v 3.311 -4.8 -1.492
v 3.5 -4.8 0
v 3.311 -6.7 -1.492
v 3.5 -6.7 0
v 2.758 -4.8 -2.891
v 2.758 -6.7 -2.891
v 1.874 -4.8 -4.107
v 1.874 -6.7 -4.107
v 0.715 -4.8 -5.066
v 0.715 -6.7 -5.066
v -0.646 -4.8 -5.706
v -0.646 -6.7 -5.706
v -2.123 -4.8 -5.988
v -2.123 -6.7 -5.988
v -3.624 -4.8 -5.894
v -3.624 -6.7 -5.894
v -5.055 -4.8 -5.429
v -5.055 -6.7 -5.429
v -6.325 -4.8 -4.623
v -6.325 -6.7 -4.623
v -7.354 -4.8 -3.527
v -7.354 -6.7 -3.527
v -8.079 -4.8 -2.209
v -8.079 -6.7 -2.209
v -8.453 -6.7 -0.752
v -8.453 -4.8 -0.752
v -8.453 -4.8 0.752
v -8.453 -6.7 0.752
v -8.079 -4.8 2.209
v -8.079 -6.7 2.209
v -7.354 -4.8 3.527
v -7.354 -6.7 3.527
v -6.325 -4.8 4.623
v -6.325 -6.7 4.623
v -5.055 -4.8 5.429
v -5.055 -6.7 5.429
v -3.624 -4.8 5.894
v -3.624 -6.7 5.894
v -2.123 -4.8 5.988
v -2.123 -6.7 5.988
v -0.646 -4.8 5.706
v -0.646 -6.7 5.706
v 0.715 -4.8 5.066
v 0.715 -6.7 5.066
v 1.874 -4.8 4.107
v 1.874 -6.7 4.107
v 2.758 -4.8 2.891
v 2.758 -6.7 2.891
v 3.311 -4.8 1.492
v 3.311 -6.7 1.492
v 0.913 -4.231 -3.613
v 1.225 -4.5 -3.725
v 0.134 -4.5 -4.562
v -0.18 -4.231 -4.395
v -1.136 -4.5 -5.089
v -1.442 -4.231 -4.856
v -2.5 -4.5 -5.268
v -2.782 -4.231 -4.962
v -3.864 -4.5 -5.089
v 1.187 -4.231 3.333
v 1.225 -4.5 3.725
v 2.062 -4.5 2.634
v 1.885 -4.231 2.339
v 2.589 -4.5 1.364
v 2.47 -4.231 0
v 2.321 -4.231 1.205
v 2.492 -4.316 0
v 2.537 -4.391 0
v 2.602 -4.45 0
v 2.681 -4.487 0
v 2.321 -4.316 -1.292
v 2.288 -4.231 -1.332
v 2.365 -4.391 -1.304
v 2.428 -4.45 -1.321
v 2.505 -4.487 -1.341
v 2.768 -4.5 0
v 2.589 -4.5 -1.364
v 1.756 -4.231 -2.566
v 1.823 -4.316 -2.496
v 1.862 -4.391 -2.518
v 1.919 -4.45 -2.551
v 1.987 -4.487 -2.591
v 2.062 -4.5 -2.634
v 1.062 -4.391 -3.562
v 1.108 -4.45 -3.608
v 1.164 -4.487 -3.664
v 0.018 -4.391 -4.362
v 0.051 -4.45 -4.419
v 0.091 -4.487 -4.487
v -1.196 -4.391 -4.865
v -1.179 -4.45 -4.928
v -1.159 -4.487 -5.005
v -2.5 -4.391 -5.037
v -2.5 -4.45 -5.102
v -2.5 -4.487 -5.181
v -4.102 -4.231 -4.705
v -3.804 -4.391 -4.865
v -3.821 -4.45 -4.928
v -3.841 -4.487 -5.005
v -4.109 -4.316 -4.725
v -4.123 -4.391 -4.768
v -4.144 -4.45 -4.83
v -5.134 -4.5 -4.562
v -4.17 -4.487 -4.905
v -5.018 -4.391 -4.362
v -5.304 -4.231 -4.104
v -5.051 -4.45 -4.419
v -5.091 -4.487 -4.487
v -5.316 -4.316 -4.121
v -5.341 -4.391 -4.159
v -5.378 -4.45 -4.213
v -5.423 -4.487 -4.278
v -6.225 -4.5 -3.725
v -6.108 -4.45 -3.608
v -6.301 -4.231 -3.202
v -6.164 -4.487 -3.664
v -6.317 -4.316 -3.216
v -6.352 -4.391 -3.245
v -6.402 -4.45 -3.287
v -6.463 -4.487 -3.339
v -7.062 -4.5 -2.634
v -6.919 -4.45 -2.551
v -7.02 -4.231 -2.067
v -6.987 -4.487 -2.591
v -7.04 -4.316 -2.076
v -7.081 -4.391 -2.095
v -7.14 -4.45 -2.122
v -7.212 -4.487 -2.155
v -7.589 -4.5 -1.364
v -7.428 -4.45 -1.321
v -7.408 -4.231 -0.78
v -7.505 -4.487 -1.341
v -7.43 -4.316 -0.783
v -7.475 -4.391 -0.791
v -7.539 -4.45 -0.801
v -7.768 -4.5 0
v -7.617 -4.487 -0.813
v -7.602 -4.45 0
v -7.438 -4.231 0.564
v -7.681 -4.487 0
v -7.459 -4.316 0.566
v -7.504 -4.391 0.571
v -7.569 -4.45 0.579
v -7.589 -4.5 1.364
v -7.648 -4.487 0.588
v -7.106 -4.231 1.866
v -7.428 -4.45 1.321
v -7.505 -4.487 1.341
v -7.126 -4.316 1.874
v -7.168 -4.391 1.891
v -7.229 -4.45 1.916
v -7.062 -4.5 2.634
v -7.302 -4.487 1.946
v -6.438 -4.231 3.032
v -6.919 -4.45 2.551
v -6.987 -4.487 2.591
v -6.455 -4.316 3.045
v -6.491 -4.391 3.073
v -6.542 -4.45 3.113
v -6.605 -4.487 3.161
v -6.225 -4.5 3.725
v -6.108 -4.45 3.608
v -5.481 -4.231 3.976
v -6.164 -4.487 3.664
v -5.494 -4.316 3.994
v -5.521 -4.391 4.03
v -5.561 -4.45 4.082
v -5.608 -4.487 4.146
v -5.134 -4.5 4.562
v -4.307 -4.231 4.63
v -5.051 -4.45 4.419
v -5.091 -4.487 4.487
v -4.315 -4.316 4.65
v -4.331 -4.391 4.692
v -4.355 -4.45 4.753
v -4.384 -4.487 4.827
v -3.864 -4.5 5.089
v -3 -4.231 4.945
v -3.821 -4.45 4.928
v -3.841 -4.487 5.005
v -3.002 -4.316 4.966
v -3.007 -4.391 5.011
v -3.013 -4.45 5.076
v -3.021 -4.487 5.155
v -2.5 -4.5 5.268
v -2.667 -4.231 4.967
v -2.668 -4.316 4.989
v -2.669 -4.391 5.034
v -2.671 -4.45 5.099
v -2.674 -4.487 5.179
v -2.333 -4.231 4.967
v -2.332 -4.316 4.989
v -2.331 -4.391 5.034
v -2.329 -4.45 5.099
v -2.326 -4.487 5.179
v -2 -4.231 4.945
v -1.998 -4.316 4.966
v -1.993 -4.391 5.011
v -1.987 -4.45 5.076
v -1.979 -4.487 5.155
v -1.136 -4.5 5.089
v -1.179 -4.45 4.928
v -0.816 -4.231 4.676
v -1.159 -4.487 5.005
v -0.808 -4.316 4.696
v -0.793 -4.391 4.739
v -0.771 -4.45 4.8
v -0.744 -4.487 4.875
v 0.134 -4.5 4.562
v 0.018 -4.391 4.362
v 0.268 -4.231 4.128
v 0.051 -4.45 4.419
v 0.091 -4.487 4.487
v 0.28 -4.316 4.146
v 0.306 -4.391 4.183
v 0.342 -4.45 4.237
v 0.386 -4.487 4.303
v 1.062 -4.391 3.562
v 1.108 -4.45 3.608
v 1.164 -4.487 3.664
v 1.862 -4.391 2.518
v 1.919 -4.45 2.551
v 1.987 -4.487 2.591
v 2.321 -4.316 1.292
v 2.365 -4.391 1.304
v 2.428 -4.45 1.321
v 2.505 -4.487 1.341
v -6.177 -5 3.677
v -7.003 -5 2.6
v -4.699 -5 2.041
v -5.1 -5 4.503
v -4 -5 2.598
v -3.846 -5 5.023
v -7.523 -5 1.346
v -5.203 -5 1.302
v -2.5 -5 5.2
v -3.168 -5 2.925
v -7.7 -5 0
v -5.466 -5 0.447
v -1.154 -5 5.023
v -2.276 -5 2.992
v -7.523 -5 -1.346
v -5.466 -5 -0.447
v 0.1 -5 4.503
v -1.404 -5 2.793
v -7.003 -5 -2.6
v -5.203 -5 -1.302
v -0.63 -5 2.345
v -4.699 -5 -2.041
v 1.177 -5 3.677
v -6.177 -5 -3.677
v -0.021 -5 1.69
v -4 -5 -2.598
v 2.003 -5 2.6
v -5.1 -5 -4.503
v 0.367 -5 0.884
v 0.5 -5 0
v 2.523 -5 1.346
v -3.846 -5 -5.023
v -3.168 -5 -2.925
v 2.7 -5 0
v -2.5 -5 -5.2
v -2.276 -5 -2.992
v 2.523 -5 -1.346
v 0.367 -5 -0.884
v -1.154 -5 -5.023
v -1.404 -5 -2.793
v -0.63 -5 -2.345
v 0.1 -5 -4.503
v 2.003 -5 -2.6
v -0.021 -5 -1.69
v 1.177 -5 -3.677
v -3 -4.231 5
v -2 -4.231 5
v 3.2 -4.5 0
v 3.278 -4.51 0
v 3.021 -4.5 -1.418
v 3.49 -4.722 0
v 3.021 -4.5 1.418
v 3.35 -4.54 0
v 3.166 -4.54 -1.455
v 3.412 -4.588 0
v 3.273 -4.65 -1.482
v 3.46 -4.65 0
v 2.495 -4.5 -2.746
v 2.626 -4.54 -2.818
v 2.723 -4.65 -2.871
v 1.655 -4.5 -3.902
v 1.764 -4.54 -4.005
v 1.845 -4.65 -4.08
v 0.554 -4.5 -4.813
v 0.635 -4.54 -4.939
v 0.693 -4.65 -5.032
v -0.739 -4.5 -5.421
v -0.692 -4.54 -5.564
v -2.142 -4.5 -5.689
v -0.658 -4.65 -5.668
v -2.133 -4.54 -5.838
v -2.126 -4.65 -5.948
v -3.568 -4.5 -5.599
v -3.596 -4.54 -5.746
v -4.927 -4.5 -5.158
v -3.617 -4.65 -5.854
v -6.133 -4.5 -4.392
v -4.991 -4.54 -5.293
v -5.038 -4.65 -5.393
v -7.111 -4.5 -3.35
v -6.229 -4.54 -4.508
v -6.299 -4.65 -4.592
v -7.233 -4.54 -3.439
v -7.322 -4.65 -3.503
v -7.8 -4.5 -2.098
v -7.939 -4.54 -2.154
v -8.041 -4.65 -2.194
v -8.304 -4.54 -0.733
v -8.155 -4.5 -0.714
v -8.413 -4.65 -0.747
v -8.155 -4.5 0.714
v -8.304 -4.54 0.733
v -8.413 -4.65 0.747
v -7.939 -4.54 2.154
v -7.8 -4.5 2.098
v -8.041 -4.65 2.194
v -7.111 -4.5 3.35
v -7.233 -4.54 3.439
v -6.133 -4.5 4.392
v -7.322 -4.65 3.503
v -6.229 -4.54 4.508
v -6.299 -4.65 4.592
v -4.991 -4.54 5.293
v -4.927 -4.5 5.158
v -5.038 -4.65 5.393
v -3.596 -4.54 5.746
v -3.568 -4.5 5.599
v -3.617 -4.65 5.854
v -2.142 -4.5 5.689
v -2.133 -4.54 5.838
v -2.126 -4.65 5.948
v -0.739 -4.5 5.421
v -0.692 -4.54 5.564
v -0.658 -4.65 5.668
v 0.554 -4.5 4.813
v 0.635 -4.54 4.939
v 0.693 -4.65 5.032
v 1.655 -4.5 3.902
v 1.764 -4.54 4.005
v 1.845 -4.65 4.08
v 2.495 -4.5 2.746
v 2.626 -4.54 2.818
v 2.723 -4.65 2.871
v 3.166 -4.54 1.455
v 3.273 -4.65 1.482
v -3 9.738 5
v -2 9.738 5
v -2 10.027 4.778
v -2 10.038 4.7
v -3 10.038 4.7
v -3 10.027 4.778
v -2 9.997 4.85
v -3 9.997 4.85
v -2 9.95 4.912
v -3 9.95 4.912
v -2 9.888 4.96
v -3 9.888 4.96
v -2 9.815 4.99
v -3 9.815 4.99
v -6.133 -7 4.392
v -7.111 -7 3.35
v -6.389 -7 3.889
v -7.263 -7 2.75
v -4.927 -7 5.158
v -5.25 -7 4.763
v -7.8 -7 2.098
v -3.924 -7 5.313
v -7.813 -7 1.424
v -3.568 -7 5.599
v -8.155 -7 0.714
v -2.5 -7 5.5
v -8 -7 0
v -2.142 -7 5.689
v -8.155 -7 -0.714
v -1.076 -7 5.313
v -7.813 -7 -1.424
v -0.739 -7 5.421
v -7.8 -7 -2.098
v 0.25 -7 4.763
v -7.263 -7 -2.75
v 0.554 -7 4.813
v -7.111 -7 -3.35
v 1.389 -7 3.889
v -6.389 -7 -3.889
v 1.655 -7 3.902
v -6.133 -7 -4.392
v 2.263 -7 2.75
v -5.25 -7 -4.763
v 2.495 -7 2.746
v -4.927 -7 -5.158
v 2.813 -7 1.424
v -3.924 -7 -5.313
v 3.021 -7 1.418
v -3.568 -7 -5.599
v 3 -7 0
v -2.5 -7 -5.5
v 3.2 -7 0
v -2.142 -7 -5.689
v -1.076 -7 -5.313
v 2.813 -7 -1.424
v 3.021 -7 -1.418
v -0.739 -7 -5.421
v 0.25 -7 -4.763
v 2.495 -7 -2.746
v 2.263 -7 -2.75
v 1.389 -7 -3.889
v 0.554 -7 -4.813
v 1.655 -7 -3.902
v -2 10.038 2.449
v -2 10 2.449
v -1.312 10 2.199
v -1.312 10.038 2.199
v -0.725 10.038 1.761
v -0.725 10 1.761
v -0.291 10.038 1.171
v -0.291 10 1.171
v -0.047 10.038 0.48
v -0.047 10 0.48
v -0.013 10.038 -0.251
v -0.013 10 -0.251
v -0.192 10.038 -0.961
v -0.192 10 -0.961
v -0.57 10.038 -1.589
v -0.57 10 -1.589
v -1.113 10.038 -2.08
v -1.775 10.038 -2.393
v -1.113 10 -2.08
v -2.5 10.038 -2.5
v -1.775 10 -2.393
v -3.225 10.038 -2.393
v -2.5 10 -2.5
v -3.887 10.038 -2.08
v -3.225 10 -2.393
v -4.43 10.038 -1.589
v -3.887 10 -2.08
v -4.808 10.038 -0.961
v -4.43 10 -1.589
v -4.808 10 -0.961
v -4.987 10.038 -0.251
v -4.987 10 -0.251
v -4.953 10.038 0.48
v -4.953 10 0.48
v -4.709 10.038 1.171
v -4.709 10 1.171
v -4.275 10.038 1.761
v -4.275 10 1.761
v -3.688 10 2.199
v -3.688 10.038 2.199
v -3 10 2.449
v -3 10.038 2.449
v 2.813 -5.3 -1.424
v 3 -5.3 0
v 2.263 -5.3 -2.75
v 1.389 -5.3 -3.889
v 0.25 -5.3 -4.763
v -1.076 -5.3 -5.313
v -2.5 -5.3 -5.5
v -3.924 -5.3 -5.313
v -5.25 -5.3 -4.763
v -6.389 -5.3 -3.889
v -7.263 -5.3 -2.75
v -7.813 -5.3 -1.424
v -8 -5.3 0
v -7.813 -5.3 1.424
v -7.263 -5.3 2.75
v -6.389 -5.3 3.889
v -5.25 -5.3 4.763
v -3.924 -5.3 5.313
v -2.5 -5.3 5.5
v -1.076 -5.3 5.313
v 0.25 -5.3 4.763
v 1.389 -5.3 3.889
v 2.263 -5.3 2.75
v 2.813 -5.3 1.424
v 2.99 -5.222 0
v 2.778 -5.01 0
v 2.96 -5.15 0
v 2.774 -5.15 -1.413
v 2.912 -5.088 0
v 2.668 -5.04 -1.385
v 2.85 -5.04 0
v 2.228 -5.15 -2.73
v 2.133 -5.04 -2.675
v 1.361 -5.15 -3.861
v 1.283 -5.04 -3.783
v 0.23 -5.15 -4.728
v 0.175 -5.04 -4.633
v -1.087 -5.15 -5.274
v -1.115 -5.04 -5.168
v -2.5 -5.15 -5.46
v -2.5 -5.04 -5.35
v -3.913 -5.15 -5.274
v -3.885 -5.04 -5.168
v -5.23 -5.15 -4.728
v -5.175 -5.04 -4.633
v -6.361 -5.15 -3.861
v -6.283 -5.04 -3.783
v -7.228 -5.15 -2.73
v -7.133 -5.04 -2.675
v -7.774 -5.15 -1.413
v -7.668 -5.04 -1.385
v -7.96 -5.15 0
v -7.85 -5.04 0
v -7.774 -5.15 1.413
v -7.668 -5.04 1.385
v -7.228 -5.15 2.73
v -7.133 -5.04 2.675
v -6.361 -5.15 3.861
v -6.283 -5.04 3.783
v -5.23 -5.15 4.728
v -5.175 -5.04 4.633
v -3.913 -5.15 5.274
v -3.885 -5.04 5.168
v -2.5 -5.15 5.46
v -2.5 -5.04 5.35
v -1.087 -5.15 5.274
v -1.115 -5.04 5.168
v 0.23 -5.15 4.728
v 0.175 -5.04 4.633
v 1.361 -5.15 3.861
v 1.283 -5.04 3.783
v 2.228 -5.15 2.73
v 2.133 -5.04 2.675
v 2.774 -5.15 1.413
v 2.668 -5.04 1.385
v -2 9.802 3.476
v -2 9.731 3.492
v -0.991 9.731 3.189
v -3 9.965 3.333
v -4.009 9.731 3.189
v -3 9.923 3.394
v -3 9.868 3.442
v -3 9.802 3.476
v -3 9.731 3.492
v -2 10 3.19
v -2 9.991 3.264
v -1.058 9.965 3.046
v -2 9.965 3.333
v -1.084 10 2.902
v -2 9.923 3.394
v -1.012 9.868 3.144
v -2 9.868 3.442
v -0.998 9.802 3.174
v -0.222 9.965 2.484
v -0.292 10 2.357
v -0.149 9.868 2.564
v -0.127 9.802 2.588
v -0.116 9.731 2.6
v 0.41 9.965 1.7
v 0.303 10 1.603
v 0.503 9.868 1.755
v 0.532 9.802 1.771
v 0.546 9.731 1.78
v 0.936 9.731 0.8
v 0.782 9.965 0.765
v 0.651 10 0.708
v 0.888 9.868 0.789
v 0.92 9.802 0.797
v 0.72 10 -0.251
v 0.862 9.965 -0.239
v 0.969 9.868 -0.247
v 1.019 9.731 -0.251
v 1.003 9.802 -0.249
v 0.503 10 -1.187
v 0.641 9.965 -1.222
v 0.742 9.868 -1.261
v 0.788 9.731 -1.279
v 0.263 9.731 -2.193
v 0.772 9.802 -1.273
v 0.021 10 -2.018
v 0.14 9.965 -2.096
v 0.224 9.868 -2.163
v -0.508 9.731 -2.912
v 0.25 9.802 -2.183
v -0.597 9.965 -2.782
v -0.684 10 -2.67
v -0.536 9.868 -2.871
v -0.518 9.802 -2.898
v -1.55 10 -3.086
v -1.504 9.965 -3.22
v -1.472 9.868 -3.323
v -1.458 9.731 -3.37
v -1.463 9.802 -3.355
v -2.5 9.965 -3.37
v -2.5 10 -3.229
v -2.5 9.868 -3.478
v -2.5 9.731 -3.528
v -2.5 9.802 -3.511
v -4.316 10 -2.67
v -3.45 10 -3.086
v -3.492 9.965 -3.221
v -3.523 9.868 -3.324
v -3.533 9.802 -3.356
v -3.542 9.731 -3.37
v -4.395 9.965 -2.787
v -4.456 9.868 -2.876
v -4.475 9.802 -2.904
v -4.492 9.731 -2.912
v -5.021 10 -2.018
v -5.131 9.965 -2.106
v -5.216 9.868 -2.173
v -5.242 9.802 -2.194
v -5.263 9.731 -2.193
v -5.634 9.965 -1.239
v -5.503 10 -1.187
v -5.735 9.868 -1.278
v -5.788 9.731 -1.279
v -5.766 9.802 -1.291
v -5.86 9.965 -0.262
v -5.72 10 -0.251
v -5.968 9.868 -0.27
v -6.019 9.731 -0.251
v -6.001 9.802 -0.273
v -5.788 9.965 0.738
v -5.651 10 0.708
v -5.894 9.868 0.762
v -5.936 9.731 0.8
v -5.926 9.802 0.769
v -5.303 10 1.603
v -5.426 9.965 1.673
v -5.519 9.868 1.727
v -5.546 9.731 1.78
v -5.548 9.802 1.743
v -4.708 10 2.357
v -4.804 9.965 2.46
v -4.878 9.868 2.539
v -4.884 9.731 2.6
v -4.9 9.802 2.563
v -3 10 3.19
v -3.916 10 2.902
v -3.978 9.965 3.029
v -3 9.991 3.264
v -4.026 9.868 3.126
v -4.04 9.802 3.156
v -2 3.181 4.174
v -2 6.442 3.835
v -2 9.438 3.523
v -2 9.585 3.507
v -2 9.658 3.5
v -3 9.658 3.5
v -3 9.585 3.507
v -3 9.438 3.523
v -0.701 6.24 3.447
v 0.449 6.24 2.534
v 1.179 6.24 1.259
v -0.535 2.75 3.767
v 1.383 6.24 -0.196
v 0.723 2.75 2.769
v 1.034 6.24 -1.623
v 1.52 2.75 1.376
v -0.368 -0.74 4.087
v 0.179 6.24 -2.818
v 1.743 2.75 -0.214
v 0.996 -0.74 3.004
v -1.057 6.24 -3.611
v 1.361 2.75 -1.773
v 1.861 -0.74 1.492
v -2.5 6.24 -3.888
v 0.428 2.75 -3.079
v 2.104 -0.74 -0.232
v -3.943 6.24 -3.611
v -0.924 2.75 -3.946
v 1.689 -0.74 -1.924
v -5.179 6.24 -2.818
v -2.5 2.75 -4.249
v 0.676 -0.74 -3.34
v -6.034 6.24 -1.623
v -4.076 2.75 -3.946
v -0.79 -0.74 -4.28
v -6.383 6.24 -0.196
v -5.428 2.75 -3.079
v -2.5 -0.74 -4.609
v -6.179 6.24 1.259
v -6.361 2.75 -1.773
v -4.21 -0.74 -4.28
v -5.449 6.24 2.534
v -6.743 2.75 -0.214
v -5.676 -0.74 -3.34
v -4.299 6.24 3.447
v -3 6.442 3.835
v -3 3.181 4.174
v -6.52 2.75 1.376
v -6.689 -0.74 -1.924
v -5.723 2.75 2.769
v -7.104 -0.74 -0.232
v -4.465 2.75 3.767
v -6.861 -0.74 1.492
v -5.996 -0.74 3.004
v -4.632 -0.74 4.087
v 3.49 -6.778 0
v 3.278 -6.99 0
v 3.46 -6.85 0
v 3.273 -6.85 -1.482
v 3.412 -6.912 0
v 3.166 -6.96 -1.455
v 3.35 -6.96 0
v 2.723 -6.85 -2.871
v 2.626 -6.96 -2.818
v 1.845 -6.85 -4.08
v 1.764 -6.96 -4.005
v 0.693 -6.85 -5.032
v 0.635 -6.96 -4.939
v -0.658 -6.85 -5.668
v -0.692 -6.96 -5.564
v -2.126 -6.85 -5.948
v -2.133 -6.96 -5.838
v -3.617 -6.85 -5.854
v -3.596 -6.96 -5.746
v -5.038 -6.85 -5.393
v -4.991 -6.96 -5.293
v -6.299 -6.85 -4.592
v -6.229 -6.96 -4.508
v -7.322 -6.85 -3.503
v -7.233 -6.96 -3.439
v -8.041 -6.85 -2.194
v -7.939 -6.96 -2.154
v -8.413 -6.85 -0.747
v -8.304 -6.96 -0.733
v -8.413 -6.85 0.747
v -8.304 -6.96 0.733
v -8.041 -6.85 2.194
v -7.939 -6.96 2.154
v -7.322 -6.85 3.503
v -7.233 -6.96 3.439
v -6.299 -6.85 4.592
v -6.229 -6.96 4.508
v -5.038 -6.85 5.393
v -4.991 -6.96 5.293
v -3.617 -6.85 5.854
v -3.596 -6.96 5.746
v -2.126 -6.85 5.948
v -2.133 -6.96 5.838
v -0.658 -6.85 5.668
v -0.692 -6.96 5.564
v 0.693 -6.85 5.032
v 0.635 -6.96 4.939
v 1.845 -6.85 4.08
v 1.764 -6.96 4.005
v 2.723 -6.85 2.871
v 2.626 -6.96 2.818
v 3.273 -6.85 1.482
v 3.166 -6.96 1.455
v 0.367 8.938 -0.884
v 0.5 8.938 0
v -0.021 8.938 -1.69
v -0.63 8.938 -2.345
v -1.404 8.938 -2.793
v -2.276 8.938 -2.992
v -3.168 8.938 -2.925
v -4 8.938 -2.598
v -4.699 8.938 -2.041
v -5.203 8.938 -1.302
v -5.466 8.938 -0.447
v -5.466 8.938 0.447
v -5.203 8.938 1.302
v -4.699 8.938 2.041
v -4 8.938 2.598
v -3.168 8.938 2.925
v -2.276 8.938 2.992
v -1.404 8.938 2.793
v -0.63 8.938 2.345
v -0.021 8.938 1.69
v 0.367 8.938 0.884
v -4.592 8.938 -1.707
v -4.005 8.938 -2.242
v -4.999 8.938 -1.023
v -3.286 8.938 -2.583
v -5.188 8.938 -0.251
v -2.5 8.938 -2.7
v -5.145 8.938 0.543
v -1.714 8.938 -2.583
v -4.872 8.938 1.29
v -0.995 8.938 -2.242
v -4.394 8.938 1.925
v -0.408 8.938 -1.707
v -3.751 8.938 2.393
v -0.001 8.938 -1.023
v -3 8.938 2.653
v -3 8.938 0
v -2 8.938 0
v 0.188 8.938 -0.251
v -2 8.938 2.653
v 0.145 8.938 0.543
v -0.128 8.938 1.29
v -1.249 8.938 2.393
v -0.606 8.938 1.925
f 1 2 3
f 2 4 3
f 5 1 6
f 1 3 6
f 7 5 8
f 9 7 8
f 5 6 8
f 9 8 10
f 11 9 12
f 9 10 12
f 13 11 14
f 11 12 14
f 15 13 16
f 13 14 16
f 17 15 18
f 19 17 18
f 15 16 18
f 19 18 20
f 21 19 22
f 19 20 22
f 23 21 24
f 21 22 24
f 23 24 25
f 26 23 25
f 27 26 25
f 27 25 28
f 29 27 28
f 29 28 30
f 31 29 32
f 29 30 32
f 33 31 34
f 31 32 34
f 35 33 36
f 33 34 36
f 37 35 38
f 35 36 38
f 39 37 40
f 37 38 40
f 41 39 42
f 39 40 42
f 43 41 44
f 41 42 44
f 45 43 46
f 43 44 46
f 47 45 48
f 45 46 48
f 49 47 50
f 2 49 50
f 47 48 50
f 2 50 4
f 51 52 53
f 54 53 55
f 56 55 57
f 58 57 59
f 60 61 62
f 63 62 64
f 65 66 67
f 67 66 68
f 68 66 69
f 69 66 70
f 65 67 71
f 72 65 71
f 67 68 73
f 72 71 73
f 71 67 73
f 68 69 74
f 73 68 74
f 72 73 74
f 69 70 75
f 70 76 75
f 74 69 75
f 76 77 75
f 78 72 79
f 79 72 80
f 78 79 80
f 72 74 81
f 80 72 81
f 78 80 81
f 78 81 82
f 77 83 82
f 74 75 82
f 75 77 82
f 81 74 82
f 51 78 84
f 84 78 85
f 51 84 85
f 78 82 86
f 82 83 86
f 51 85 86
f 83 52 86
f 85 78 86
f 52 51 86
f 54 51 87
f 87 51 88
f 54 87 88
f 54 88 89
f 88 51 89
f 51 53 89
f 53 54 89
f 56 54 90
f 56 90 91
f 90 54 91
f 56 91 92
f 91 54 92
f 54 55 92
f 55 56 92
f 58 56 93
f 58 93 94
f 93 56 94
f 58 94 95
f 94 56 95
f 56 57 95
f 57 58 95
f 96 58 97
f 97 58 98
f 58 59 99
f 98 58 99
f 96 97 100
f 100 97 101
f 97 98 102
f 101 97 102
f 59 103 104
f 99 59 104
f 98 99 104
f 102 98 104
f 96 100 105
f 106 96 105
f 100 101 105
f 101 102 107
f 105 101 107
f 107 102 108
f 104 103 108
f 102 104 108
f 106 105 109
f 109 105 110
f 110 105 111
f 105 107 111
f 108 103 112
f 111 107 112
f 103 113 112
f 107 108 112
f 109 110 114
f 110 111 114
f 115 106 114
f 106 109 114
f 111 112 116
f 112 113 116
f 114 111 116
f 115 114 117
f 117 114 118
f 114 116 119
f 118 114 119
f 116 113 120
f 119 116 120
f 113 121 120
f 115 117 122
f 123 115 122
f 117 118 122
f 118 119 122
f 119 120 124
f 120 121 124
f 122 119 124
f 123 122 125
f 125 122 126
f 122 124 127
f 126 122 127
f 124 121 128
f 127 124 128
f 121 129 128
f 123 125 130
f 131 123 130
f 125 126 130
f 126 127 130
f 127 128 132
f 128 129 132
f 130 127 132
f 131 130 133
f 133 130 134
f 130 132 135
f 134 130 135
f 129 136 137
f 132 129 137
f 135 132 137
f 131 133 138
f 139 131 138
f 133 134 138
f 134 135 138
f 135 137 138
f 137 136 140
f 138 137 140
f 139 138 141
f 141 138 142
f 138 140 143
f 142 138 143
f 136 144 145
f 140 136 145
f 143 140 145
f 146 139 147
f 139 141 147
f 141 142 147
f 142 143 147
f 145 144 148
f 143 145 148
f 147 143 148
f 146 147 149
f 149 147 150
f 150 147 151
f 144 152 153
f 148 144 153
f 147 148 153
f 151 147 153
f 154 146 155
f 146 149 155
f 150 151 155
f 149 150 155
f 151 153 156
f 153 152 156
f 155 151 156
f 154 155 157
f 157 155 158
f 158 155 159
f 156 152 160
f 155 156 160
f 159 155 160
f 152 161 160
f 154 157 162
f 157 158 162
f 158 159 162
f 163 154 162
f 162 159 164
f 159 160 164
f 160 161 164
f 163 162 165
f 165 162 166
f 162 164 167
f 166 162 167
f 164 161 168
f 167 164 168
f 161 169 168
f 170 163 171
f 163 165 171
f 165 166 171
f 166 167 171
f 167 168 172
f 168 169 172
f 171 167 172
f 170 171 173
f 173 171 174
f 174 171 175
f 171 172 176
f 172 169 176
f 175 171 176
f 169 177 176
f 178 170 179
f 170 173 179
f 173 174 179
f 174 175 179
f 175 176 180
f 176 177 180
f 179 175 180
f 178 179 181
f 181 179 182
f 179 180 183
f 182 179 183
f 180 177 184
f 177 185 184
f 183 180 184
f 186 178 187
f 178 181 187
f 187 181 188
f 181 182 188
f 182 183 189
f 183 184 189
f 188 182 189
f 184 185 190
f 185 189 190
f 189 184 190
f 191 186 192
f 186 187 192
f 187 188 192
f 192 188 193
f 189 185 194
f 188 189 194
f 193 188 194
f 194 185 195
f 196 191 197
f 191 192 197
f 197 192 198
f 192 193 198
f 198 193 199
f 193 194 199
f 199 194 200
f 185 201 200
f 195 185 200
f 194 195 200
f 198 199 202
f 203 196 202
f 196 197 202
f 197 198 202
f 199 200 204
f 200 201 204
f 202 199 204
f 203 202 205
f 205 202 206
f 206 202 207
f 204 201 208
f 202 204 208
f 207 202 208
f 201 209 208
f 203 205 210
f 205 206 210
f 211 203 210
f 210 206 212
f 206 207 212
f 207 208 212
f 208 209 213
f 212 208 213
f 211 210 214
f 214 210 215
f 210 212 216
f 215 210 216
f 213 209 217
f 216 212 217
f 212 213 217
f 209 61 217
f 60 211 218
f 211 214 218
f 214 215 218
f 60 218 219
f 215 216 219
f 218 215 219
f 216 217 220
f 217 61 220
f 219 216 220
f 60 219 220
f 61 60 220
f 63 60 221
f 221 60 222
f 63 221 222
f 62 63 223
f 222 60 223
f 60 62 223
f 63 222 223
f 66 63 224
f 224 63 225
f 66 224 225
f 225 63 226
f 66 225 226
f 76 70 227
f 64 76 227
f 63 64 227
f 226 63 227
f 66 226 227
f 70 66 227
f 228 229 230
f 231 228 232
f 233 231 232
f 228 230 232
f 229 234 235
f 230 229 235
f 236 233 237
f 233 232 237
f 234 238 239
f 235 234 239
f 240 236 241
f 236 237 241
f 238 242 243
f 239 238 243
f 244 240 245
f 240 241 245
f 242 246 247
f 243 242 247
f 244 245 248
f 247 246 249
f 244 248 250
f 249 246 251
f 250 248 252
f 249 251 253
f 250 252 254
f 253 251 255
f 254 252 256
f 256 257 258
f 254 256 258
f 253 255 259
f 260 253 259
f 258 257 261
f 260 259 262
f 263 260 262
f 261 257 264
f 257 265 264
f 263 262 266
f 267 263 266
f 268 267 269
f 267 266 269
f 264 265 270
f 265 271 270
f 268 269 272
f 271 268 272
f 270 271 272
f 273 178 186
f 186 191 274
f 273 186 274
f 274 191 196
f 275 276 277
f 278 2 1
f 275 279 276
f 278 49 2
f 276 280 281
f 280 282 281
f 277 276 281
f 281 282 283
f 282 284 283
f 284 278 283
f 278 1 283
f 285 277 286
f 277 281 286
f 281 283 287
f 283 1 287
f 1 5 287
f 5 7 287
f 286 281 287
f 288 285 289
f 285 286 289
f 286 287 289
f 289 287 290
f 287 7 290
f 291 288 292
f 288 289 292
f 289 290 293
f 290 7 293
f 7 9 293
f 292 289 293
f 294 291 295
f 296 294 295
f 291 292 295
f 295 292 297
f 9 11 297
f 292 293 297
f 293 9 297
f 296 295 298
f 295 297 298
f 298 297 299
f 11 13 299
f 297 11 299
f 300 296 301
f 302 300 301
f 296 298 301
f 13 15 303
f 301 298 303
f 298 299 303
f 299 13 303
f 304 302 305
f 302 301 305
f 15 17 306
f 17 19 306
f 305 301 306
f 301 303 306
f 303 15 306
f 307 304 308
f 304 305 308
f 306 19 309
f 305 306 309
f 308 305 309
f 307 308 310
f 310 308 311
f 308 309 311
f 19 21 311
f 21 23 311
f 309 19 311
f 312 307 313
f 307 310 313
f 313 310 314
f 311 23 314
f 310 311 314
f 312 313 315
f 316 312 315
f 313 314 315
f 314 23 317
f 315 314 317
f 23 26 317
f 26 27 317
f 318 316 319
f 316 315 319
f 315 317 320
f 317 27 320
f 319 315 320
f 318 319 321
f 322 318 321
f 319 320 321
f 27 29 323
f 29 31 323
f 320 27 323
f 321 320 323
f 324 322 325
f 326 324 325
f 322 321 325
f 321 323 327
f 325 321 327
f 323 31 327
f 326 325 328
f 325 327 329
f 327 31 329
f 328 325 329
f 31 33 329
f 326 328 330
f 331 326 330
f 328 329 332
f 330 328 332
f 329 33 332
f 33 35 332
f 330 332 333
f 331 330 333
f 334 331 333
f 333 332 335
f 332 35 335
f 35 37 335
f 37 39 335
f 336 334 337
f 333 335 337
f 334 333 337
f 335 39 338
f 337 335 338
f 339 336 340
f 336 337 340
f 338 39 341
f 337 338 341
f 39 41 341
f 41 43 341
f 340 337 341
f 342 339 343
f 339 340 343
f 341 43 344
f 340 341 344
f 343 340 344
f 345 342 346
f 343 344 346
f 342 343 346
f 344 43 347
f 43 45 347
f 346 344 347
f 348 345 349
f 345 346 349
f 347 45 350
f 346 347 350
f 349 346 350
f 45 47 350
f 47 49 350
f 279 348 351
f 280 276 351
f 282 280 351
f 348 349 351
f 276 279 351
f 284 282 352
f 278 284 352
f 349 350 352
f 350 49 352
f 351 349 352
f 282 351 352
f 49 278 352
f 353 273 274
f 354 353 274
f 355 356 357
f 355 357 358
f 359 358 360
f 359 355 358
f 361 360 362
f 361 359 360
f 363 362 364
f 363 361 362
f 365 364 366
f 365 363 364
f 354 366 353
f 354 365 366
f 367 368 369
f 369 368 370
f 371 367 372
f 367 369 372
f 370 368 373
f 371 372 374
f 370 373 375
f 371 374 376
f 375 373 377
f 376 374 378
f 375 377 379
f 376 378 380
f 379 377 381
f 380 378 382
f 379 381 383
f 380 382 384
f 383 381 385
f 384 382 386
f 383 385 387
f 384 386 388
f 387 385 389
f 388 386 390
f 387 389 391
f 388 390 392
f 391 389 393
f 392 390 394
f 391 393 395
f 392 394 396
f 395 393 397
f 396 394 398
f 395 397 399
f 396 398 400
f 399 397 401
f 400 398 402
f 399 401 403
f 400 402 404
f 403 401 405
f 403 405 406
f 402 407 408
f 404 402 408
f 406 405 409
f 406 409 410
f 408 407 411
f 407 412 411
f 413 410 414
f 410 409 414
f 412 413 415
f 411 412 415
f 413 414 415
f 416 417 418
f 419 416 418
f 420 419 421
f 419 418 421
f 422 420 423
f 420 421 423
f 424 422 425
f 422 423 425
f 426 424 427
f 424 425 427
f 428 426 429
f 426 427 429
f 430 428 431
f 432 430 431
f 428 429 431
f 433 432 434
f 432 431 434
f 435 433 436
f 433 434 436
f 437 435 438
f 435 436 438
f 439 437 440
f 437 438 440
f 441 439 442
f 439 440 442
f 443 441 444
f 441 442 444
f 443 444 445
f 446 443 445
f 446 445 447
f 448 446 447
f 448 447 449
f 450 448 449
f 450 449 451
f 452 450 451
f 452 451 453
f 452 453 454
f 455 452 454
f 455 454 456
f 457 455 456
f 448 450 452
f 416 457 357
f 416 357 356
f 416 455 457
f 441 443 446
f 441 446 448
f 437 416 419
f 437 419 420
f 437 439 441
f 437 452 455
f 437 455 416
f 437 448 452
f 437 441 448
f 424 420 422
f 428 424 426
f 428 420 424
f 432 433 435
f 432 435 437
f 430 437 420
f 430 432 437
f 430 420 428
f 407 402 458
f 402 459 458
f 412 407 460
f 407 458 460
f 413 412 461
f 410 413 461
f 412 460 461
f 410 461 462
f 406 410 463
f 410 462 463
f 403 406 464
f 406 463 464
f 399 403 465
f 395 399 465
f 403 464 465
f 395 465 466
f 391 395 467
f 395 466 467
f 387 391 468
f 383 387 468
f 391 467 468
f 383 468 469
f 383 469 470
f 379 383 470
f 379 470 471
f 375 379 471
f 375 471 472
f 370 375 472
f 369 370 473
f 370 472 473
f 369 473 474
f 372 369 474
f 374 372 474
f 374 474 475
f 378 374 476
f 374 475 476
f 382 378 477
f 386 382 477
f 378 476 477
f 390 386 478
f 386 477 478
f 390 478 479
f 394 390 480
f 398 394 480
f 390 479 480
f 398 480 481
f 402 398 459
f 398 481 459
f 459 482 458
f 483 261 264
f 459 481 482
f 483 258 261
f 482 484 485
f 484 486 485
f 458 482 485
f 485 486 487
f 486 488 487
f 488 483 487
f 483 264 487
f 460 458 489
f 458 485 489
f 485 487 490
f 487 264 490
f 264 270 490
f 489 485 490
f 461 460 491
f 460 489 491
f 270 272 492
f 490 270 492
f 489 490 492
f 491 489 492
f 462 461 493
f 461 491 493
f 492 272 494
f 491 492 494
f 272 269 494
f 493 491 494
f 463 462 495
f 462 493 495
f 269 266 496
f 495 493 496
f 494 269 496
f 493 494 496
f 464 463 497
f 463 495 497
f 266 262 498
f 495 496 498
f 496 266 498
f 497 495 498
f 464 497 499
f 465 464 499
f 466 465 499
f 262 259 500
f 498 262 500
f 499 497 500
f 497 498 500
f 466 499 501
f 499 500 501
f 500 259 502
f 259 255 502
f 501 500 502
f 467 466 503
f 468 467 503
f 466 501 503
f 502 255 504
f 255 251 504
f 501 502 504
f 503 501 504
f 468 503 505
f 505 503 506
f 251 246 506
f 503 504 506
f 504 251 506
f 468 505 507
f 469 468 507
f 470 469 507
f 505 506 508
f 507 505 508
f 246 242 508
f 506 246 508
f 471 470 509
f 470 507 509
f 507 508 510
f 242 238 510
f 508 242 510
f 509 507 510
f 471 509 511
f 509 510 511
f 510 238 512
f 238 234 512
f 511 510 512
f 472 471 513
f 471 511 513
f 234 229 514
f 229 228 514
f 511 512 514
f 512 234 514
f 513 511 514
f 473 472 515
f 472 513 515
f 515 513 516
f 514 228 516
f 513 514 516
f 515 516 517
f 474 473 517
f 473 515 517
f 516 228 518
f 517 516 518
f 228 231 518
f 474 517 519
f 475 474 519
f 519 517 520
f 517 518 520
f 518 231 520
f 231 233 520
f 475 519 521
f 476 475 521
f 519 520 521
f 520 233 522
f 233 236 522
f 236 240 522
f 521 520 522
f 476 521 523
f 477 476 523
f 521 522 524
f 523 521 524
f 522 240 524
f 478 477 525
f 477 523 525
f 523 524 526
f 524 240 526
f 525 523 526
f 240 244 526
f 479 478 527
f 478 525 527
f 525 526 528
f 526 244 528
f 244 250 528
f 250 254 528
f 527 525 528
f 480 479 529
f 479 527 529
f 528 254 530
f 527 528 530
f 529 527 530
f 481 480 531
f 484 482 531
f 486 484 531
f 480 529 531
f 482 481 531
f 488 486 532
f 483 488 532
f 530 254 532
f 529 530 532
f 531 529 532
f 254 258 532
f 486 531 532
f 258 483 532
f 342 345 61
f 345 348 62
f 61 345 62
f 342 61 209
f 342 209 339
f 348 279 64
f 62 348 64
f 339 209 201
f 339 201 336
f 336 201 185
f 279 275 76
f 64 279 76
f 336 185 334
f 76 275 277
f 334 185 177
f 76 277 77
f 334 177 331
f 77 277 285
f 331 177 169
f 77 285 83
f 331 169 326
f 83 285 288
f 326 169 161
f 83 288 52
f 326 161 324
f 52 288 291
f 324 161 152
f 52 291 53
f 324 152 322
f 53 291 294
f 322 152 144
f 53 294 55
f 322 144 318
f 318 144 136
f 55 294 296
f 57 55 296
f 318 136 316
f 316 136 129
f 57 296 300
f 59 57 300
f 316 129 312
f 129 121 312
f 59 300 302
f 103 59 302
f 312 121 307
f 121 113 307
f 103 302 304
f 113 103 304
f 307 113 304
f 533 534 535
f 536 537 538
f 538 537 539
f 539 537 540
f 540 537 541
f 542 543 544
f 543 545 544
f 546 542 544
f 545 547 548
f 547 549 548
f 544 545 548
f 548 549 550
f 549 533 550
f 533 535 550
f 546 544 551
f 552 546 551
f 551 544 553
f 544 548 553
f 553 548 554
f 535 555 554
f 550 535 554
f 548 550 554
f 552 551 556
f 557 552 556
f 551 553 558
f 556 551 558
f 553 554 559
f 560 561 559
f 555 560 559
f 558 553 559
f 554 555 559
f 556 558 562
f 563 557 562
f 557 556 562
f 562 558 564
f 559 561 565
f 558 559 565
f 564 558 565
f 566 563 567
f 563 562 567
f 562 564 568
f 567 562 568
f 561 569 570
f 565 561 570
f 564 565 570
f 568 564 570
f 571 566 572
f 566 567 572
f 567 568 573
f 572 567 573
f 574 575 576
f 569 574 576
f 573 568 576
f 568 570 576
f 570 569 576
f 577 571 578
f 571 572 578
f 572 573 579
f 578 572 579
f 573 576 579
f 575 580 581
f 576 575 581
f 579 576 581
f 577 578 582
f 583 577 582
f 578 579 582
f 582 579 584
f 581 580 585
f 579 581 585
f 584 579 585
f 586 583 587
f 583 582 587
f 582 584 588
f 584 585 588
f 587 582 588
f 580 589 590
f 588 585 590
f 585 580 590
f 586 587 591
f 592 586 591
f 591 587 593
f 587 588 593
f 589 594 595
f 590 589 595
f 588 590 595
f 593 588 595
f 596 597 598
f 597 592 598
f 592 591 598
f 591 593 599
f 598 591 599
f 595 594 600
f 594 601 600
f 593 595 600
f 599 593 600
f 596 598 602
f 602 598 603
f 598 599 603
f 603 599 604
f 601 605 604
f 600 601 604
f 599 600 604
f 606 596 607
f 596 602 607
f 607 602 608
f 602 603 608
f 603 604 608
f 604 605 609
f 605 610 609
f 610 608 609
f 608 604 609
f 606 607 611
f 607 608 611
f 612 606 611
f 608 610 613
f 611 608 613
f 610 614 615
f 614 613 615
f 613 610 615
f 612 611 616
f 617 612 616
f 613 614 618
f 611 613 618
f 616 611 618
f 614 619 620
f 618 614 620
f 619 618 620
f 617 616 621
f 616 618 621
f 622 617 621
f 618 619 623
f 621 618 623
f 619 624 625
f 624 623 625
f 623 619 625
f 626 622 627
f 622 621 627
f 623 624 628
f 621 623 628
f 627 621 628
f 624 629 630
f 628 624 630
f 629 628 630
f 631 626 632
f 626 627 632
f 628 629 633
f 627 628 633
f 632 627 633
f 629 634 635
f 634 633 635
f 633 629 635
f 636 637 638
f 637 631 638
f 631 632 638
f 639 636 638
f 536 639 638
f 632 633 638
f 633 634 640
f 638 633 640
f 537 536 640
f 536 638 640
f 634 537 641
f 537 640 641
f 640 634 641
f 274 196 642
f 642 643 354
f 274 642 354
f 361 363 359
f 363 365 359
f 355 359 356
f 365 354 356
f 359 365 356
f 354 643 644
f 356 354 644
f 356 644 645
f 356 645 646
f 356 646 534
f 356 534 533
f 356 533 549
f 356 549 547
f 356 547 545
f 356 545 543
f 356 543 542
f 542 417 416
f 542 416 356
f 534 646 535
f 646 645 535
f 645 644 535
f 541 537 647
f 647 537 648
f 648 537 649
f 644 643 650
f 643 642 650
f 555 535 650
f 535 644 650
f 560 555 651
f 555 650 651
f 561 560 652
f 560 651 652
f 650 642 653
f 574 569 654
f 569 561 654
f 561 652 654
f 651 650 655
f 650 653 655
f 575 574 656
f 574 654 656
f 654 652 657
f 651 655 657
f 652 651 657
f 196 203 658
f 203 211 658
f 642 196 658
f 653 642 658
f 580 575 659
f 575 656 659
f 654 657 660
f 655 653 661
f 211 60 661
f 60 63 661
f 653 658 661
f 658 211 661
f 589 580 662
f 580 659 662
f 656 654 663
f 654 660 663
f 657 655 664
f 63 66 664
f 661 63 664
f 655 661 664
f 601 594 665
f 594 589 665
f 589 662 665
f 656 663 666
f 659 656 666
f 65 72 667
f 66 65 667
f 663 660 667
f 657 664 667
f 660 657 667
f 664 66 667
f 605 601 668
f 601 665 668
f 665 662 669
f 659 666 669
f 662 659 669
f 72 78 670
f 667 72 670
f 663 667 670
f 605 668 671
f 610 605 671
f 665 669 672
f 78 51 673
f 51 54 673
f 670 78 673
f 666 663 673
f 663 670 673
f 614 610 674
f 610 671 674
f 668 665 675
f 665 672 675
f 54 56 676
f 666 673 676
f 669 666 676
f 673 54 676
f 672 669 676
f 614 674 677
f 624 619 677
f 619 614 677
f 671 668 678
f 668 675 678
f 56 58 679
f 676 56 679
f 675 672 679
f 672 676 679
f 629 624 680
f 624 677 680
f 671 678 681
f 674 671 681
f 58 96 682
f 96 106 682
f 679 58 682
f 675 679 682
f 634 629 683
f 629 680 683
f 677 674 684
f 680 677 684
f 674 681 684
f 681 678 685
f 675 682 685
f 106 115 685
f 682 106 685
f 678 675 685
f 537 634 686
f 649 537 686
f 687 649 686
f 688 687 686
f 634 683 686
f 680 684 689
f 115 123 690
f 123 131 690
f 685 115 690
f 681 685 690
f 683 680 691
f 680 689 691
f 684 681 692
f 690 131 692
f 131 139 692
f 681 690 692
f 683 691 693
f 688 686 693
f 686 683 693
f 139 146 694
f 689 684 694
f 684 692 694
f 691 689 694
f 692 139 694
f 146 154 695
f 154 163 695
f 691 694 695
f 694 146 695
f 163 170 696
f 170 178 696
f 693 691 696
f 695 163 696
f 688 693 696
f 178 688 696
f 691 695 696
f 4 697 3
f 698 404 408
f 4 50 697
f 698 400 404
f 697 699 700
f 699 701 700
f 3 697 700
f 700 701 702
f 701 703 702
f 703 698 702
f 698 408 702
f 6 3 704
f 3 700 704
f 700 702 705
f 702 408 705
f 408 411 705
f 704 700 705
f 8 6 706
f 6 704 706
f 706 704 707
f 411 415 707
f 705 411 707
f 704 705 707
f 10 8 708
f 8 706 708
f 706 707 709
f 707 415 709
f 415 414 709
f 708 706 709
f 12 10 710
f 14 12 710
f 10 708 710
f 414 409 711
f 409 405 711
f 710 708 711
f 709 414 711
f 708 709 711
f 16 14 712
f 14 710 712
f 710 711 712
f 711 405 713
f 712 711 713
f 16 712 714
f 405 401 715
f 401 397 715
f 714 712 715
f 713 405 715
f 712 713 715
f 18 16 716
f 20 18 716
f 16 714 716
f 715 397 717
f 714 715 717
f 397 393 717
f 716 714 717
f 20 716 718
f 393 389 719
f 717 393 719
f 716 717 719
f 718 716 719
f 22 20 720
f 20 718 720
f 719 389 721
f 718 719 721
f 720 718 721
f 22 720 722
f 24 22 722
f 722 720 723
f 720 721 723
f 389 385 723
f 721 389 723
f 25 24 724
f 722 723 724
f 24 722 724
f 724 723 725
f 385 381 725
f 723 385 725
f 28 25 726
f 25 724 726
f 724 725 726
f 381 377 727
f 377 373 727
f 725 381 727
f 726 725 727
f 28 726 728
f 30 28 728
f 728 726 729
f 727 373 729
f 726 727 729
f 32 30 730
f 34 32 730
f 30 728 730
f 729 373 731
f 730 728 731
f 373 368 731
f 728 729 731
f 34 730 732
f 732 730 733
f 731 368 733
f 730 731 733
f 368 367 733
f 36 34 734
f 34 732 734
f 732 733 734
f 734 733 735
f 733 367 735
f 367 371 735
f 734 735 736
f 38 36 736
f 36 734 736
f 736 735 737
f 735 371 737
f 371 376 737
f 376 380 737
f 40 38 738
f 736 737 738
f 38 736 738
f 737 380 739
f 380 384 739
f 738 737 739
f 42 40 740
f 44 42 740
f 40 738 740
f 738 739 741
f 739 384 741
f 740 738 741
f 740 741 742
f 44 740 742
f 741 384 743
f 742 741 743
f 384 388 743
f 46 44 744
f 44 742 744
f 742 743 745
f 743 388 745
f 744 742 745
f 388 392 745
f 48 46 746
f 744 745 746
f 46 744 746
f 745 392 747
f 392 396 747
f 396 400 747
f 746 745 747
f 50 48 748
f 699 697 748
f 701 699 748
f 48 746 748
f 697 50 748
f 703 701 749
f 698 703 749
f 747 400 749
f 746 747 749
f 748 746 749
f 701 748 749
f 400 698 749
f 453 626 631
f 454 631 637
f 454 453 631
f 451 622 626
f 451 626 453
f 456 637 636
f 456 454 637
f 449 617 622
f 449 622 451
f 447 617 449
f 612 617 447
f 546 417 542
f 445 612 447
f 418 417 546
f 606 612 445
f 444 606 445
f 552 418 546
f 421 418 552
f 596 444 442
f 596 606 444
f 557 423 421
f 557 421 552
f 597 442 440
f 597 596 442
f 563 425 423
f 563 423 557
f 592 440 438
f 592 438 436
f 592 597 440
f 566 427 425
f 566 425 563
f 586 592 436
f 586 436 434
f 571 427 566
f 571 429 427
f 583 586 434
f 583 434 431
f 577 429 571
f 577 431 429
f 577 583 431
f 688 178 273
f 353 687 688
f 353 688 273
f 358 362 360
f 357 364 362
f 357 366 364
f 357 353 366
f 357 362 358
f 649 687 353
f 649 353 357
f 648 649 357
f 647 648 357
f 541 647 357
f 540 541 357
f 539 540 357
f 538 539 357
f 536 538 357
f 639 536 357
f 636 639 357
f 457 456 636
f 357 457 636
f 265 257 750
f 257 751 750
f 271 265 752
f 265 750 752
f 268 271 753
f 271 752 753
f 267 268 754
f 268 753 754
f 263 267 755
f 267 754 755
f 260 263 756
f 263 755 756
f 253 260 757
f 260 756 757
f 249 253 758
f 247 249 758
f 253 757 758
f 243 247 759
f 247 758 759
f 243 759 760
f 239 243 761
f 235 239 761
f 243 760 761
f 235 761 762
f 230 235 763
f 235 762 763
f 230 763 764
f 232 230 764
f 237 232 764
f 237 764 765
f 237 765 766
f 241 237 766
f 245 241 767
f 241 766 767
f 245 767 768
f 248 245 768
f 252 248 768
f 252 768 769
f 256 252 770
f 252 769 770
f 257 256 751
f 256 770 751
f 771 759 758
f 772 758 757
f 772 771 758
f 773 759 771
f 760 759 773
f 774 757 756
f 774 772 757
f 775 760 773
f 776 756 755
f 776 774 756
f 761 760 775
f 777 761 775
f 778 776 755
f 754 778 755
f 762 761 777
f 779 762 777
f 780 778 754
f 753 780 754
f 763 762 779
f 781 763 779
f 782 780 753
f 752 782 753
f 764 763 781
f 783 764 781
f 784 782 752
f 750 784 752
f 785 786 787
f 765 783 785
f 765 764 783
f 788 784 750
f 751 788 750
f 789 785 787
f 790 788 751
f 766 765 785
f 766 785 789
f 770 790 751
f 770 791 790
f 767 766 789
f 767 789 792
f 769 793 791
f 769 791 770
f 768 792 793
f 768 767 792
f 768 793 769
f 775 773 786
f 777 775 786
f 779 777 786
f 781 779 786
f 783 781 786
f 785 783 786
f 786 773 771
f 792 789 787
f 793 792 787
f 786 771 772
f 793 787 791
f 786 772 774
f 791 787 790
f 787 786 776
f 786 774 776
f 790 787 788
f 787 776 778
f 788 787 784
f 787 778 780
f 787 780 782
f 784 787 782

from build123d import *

# Parameters (mm, degrees)
CROQUIS2_W              = 1
CROQUIS2_H              = 14.230822787
SALIENTE_EXTRUIR1_DEPTH = 5
SALIENTE_EXTRUIR3_DEPTH = 0.6
CORTAR_EXTRUIR1_DEPTH   = 10.6
CROQUIS5_R              = 3
CORTAR_EXTRUIR2_DEPTH   = 13.937547


with BuildPart() as part:
    # Croquis1 → Revolución1 (revolve)
    with BuildSketch(Plane.XY):
        with BuildLine():
            ThreePointArc((0.729390716, 10), (0.930329965, 9.922763143), (1.027803108, 9.730822787))
            Line((1.027803108, 9.730822787), (2.469890767, -4.230822787))
            ThreePointArc((2.469890767, -4.230822787), (2.56736391, -4.422763143), (2.768303159, -4.5))
            Line((2.768303159, -4.5), (3.2, -4.5))
            ThreePointArc((3.2, -4.5), (3.412132034, -4.587867966), (3.5, -4.8))
            Line((3.5, -4.8), (3.5, -6.7))
            ThreePointArc((3.5, -6.7), (3.412132034, -6.912132034), (3.2, -7))
            Line((3.2, -7), (3, -7))
            Line((3, -7), (3, -5.3))
            ThreePointArc((3, -5.3), (2.912132034, -5.087867966), (2.7, -5))
            Line((2.7, -5), (0.5, -5))
            Line((0.5, -5), (0.5, 8.637546769))
            ThreePointArc((0.5, 8.637546769), (0.412132034, 8.849678803), (0.2, 8.937546769))
            Line((0.2, 8.937546769), (-2.5, 8.937546769))
            Line((-2.5, 8.937546769), (-2.5, 9.437546769))
            Line((-2.5, 9.437546769), (0, 9.437546769))
            Line((0, 9.437546769), (0, 10))
            Line((0, 10), (0.729390716, 10))
        make_face()
    revolve(axis=Axis((-2.5, -7, 0), (0, 1, 0)))

    # Croquis2 → Saliente-Extruir1 (add)
    with BuildSketch(Plane.XY):
        with Locations((-2.5, 2.884588606)):
            Rectangle(CROQUIS2_W, CROQUIS2_H)
    extrude(amount=SALIENTE_EXTRUIR1_DEPTH)

    # Croquis3 → Saliente-Extruir3 (add)
    with BuildSketch(Plane(origin=(0, 9.437546769, 0), x_dir=(1, 0, 0), z_dir=(0, 1, 0))):
        with BuildLine():
            Line((-3, -4.944675342), (-2, -5))
            Line((-2, -5), (-2, -2.449489743))
            ThreePointArc((-2, -2.449489743), (-2.5, 2.5), (-3, -2.449489743))
            Line((-3, -2.449489743), (-3, -4.944675342))
        make_face()
    extrude(amount=SALIENTE_EXTRUIR3_DEPTH)

    # Croquis4 → Cortar-Extruir1 (cut)
    with BuildSketch(Plane(origin=(-2, 0, 0), x_dir=(0, 0, -1), z_dir=(1, 0, 0))):
        with BuildLine():
            Line((-5, 9.737546769), (-5, 10.037546769))
            Line((-5, 10.037546769), (-4.7, 10.037546769))
            ThreePointArc((-4.7, 10.037546769), (-4.912132034, 9.949678803), (-5, 9.737546769))
        make_face()
    extrude(amount=-CORTAR_EXTRUIR1_DEPTH, mode=Mode.SUBTRACT)

    # Croquis5 → Cortar-Extruir2 (cut)
    with BuildSketch(Plane.XZ.offset(5)):
        with Locations((-2.5, 0)):
            Circle(CROQUIS5_R)
    extrude(amount=-CORTAR_EXTRUIR2_DEPTH, mode=Mode.SUBTRACT)


solid = part.part
